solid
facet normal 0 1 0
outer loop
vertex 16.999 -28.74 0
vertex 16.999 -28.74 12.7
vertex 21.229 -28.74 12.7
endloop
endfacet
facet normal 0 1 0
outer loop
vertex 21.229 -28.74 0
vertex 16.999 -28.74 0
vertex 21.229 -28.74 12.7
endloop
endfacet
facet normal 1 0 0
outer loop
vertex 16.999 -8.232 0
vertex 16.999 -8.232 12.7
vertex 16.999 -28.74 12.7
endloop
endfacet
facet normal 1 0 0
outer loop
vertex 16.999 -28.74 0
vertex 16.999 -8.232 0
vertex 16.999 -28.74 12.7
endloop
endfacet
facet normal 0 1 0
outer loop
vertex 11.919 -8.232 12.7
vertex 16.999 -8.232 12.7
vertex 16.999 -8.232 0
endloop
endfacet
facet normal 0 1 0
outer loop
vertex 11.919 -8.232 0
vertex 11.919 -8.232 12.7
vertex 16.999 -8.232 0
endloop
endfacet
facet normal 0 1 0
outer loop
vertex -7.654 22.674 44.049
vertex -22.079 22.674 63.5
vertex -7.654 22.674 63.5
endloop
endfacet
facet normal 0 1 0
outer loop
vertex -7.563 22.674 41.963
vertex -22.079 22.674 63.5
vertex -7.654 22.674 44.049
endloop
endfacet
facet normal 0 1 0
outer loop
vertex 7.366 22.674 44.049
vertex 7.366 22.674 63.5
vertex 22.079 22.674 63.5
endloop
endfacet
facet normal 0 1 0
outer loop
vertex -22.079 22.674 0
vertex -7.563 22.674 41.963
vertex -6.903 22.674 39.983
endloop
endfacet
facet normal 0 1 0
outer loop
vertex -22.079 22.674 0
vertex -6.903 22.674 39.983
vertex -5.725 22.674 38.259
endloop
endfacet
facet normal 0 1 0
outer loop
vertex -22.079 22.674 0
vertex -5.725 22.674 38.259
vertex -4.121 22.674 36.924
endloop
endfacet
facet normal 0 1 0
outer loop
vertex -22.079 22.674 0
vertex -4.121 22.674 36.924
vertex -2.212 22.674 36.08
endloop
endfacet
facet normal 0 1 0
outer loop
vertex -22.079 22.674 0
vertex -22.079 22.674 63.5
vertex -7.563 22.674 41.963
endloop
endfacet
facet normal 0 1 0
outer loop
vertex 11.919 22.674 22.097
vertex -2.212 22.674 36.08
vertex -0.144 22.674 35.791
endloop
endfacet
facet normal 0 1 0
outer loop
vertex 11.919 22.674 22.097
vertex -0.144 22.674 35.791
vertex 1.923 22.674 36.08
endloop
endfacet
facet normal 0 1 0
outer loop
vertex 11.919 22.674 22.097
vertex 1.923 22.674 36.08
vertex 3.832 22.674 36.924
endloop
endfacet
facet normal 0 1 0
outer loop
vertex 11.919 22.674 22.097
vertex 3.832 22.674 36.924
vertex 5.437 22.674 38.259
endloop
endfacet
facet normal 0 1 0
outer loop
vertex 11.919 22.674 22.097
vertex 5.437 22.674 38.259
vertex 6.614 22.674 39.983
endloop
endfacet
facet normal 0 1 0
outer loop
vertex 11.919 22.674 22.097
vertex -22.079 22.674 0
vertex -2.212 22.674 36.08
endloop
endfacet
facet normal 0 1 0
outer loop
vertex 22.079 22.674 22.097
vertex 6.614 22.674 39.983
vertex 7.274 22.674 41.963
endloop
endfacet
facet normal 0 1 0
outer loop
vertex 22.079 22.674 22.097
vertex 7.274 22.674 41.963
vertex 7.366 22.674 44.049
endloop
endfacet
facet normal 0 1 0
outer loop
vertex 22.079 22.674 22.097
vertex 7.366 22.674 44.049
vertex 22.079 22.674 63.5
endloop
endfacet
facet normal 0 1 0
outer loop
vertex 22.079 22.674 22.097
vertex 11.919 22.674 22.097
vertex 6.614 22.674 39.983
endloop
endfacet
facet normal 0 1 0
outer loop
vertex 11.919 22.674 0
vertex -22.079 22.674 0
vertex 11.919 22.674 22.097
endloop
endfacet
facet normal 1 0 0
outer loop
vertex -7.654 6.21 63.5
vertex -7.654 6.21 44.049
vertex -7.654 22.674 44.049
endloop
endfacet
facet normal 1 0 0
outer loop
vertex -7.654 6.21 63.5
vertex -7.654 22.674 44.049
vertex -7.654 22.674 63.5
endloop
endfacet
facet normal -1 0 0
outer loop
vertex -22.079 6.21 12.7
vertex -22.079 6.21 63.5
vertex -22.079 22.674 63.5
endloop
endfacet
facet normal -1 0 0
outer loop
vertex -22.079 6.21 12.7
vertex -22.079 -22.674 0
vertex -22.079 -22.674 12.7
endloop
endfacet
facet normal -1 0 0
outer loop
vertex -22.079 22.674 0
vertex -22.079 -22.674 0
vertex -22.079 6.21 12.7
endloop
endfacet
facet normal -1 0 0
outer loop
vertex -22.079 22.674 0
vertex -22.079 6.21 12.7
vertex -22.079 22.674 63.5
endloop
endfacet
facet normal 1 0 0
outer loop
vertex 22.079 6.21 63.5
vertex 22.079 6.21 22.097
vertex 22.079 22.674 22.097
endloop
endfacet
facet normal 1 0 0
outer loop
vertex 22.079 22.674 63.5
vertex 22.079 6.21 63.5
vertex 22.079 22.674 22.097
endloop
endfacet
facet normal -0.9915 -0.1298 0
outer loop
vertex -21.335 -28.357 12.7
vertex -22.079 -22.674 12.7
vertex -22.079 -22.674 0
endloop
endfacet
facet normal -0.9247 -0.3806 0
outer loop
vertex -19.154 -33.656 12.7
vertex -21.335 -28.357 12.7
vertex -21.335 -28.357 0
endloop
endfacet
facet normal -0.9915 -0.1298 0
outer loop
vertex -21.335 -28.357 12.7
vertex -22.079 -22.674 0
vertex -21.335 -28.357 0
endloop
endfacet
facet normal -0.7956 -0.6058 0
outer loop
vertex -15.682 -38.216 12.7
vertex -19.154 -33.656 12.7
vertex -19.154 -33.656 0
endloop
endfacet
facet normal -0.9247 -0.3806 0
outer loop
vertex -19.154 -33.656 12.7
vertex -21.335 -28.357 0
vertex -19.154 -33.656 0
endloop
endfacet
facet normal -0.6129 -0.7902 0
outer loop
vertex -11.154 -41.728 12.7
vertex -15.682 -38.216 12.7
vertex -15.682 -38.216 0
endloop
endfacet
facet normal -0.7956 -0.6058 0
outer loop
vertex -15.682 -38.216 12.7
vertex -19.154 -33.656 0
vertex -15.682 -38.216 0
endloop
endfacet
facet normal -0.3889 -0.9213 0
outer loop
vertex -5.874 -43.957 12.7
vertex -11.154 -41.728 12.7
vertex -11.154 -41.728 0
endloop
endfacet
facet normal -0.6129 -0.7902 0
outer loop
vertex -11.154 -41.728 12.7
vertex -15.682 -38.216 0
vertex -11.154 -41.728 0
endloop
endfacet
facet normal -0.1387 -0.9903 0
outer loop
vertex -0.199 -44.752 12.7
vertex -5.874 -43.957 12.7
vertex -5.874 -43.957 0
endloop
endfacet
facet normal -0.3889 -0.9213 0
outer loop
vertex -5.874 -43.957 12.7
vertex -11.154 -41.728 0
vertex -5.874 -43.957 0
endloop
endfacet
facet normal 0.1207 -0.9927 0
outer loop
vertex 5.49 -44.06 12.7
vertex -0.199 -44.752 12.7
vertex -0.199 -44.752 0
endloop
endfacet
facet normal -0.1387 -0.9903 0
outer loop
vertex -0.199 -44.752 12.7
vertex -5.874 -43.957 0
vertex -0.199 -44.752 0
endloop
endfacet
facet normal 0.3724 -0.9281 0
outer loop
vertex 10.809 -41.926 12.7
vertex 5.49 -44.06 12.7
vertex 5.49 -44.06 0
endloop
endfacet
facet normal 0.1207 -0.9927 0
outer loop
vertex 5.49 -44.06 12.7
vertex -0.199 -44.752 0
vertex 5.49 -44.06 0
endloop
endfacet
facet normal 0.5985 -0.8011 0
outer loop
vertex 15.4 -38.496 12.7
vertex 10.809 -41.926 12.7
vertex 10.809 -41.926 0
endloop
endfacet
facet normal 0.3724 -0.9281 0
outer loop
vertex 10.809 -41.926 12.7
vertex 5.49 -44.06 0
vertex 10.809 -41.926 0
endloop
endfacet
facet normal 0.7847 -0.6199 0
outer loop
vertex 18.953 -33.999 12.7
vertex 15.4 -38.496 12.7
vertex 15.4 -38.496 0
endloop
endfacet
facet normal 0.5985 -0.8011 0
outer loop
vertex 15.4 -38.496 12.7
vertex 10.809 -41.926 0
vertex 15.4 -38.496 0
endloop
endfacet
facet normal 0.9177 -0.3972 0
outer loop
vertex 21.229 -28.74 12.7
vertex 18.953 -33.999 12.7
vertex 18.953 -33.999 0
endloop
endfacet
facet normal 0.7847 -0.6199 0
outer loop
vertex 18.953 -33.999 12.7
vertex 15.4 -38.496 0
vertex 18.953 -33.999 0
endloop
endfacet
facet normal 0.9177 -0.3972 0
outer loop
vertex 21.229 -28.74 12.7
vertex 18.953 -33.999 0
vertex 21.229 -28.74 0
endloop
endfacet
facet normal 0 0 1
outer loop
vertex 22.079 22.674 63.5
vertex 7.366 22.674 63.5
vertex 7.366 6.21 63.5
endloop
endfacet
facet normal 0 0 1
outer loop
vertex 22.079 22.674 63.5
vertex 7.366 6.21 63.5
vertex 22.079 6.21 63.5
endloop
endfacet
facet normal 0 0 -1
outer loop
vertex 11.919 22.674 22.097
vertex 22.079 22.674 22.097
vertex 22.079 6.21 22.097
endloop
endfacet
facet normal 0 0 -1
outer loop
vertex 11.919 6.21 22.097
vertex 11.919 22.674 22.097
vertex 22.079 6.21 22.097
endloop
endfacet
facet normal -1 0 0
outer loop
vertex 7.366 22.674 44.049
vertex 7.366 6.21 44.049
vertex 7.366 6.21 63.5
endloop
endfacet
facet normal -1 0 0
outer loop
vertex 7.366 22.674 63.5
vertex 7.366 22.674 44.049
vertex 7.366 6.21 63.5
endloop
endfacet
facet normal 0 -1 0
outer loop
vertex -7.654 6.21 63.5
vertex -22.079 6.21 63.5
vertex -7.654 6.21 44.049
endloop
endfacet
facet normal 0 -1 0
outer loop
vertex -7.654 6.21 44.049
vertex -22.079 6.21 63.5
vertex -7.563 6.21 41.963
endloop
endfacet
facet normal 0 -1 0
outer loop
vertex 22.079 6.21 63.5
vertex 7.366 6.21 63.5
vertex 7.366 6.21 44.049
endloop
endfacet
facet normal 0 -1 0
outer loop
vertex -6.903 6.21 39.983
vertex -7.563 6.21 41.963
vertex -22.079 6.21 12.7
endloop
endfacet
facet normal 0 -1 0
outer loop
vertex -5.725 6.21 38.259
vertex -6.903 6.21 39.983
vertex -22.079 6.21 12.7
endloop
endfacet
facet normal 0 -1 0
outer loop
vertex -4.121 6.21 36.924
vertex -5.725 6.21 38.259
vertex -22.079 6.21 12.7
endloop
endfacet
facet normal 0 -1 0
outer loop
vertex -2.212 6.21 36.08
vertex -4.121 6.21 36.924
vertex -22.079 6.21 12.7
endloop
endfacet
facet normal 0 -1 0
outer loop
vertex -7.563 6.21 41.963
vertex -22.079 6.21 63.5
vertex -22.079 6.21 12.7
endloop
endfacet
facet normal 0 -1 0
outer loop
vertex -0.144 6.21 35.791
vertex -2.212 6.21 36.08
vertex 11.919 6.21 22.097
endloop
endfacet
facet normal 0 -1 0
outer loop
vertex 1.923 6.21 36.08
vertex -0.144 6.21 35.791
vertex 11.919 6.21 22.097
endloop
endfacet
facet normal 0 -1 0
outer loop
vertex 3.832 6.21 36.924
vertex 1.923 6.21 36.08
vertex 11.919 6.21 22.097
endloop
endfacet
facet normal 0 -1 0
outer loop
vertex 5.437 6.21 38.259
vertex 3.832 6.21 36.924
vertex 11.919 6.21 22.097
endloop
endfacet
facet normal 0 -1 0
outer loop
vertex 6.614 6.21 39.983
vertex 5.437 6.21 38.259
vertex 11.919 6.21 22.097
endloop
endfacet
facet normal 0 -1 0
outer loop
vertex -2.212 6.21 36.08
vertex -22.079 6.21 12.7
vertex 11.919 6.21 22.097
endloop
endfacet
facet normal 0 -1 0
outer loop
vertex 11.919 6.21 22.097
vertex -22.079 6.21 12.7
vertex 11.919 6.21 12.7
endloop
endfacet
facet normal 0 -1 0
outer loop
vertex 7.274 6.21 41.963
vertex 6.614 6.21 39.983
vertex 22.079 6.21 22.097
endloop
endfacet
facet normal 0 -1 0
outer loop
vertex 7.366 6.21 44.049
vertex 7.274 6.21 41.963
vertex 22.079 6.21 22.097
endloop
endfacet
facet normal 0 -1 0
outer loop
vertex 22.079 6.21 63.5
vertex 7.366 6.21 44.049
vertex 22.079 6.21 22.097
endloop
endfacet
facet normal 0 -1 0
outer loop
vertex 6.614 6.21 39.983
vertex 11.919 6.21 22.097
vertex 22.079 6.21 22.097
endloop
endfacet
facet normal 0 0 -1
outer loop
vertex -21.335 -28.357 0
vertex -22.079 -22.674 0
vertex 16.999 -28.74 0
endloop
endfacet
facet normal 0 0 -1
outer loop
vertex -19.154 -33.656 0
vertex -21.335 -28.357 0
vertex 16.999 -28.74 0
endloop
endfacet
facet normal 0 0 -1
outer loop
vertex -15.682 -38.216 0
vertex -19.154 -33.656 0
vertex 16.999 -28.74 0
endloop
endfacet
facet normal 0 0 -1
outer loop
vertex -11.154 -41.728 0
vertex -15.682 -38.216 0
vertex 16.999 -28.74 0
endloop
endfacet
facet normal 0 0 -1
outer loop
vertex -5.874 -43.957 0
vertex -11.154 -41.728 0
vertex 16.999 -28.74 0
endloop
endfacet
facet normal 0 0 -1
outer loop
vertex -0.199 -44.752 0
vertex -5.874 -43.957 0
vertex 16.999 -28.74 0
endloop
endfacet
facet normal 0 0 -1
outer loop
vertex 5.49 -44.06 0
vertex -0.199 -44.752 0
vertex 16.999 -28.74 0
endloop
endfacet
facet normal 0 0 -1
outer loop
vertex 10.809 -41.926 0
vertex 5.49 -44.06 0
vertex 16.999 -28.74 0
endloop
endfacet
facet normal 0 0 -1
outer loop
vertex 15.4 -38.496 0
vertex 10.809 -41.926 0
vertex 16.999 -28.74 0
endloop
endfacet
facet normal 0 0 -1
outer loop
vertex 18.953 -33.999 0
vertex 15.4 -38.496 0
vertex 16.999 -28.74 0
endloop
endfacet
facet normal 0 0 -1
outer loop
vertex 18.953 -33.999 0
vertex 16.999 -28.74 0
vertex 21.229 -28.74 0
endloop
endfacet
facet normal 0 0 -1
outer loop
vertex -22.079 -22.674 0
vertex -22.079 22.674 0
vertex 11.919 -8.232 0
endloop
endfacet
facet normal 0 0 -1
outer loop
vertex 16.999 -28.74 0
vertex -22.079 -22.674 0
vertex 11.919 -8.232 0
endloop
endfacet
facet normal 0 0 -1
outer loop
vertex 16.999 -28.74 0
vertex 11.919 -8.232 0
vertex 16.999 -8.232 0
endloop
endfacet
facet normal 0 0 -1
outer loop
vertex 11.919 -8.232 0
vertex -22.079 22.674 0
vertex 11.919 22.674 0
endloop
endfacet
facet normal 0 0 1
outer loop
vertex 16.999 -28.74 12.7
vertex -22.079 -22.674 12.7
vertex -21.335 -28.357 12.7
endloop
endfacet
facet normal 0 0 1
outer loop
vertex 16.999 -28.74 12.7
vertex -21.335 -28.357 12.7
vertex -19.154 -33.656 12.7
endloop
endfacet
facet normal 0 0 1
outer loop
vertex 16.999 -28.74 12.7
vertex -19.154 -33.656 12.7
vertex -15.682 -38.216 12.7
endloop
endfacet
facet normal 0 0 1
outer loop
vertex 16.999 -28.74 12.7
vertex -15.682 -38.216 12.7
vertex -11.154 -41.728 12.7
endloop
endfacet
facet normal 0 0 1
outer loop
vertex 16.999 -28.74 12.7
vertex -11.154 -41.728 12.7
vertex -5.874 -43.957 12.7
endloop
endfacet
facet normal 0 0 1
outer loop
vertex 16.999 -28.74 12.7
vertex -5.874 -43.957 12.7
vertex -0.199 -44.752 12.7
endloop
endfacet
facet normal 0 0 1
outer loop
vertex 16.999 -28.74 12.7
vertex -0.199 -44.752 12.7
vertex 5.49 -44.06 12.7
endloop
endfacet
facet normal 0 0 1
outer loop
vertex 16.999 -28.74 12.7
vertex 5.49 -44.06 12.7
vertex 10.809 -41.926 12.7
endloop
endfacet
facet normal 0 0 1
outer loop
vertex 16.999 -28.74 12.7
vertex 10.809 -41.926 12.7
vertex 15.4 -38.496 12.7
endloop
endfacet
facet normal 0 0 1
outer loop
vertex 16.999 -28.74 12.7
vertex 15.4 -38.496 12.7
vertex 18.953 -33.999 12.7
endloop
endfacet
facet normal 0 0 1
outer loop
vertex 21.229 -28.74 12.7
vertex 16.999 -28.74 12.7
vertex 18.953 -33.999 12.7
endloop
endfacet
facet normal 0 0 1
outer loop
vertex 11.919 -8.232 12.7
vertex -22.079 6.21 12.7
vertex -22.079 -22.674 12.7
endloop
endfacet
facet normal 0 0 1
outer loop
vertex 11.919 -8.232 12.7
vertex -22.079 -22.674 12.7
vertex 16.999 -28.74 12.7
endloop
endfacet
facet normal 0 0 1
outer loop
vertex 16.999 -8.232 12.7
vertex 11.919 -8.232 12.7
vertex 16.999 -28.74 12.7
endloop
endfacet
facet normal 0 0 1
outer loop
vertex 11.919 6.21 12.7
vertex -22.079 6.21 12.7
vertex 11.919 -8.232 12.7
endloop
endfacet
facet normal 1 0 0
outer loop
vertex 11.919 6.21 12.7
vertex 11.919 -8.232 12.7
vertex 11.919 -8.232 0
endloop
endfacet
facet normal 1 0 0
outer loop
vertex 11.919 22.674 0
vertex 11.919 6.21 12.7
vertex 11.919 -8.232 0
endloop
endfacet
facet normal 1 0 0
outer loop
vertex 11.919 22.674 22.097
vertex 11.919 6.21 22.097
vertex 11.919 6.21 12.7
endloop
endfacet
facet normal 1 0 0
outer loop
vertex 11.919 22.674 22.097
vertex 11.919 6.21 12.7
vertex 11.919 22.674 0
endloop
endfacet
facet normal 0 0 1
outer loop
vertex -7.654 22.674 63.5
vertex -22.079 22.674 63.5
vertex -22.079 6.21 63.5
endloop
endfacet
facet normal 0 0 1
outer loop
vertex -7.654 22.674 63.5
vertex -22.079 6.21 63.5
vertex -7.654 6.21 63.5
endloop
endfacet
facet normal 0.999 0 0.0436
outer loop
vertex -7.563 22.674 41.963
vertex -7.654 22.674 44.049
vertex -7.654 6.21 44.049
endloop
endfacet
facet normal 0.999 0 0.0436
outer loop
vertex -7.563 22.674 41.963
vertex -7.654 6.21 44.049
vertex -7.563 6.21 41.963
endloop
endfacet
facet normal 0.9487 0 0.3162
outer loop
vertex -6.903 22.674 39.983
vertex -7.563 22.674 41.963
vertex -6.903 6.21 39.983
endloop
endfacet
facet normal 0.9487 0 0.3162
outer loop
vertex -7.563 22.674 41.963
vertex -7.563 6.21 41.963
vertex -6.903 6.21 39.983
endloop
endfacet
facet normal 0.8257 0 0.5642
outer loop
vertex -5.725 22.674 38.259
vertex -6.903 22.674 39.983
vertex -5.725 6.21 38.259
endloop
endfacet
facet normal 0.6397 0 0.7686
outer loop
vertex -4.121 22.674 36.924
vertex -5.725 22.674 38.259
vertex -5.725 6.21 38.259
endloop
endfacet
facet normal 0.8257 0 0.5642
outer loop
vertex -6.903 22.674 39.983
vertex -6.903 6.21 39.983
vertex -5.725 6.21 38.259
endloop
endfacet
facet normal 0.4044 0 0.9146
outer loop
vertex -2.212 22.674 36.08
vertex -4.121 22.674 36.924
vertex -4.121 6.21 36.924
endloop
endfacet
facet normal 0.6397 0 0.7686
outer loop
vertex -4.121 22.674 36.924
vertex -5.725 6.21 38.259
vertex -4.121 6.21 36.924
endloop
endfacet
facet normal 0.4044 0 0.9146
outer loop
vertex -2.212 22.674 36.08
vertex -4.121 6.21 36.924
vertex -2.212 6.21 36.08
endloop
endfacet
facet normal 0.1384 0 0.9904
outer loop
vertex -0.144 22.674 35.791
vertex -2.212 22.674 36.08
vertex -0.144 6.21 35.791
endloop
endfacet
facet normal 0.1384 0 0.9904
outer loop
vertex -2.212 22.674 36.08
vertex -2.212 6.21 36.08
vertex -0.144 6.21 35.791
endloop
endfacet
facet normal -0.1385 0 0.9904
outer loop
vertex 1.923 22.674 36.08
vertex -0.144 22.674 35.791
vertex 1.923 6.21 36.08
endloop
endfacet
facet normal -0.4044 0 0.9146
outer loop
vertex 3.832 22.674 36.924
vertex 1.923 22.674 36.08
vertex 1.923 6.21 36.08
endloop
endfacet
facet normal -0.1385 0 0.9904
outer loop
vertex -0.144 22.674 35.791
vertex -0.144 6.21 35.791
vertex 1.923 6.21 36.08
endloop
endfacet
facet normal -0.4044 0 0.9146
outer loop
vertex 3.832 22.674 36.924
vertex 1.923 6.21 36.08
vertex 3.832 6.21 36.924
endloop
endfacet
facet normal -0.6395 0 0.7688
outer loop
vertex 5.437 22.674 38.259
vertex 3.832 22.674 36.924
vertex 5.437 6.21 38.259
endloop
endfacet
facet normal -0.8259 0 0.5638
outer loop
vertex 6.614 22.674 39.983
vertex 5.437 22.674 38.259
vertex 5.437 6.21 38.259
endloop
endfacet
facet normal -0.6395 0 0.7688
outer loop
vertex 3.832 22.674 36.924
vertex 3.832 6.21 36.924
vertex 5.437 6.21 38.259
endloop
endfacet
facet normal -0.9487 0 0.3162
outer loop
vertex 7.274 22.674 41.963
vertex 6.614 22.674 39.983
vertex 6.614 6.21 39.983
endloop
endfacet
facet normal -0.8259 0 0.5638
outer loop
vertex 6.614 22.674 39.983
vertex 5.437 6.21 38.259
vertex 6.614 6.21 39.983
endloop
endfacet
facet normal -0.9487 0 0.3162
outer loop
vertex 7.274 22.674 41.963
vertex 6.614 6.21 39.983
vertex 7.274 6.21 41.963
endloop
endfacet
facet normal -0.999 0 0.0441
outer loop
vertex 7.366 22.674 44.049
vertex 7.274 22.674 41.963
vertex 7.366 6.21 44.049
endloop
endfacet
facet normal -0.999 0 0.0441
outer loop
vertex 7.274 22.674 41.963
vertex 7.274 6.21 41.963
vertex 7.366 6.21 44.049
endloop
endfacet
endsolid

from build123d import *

# Parameters (mm, degrees)
F0_W      = 44.1574328202
F0_H      = 45.3486293554
F1_DEPTH  = 25.4
F2_DEPTH  = 12.7
F3_W      = 44.1574328202
F3_H      = 16.4641523734
F4_DEPTH  = 50.8
F5_W      = 15.0199290365
F5_H      = 19.4511728585
F6_DEPTH  = 50.8
F8_DEPTH  = 10.16
F10_DEPTH = 50.8


with BuildPart() as f1:
    # F0 (on Top) → F1 (new body)
    with BuildSketch(Plane.XY):
        Rectangle(F0_W, F0_H)
        with BuildLine():
            Line((22.0787164101, -22.6743146777), (-22.0787164101, -22.6743146777))
            ThreePointArc((-22.0787164101, -22.6743146777), (0, -44.7530310878), (22.0787164101, -22.6743146777))
        make_face()
    extrude(amount=F1_DEPTH)

    # F2 (cut): a face of the model
    f2_faces = [f1.faces().sort_by_distance(p)[0] for p in [
        (0, -8.8639771544, 25.4),
    ]]
    extrude(f2_faces, amount=-F2_DEPTH, mode=Mode.SUBTRACT)

    # F3 (on face) → F4 (join)
    with BuildSketch(Plane.XY.offset(12.7)):
        with Locations((0, 14.442238491)):
            Rectangle(F3_W, F3_H)
    extrude(amount=F4_DEPTH)

    # F5 (on face) → F6 (cut)
    with BuildSketch(Plane.XZ.offset(-6.2101623043)):
        with Locations((-0.1444215886, 53.7744135708)):
            Rectangle(F5_W, F5_H)
        with BuildLine():
            Line((7.3655429296, 44.0488271415), (-7.6543861069, 44.0488271415))
            ThreePointArc((-7.6543861069, 44.0488271415), (-0.1444215886, 35.7909022145), (7.3655429296, 44.0488271415))
        make_face()
    extrude(amount=-F6_DEPTH, mode=Mode.SUBTRACT)

    # F7 (on face) → F8 (cut)
    with BuildSketch(Plane.YZ.offset(22.0787164101)):
        Polygon((-8.2320761867, 0), (22.6743146777, 0), (22.6743146777, 22.0966245979), (6.2101623043, 22.0966245979), (6.2101623043, 12.7), (-8.2320761867, 12.7), align=None)
    extrude(amount=-F8_DEPTH, mode=Mode.SUBTRACT)

    # F9 (on face) → F10 (cut)
    with BuildSketch(Plane.XY.offset(12.7)):
        with BuildLine():
            Line((22.0787164101, -8.2320761867), (16.9987164101, -8.2320761867))
            Line((16.9987164101, -8.2320761867), (16.9987164101, -28.7400558591))
            Line((16.9987164101, -28.7400558591), (21.229142758, -28.7400558591))
            ThreePointArc((21.229142758, -28.7400558591), (21.8652914559, -25.7367888192), (22.0787164101, -22.6743146777))
            Line((22.0787164101, -22.6743146777), (22.0787164101, -8.2320761867))
        make_face()
    extrude(amount=-F10_DEPTH, mode=Mode.SUBTRACT)


solid = f1.part
